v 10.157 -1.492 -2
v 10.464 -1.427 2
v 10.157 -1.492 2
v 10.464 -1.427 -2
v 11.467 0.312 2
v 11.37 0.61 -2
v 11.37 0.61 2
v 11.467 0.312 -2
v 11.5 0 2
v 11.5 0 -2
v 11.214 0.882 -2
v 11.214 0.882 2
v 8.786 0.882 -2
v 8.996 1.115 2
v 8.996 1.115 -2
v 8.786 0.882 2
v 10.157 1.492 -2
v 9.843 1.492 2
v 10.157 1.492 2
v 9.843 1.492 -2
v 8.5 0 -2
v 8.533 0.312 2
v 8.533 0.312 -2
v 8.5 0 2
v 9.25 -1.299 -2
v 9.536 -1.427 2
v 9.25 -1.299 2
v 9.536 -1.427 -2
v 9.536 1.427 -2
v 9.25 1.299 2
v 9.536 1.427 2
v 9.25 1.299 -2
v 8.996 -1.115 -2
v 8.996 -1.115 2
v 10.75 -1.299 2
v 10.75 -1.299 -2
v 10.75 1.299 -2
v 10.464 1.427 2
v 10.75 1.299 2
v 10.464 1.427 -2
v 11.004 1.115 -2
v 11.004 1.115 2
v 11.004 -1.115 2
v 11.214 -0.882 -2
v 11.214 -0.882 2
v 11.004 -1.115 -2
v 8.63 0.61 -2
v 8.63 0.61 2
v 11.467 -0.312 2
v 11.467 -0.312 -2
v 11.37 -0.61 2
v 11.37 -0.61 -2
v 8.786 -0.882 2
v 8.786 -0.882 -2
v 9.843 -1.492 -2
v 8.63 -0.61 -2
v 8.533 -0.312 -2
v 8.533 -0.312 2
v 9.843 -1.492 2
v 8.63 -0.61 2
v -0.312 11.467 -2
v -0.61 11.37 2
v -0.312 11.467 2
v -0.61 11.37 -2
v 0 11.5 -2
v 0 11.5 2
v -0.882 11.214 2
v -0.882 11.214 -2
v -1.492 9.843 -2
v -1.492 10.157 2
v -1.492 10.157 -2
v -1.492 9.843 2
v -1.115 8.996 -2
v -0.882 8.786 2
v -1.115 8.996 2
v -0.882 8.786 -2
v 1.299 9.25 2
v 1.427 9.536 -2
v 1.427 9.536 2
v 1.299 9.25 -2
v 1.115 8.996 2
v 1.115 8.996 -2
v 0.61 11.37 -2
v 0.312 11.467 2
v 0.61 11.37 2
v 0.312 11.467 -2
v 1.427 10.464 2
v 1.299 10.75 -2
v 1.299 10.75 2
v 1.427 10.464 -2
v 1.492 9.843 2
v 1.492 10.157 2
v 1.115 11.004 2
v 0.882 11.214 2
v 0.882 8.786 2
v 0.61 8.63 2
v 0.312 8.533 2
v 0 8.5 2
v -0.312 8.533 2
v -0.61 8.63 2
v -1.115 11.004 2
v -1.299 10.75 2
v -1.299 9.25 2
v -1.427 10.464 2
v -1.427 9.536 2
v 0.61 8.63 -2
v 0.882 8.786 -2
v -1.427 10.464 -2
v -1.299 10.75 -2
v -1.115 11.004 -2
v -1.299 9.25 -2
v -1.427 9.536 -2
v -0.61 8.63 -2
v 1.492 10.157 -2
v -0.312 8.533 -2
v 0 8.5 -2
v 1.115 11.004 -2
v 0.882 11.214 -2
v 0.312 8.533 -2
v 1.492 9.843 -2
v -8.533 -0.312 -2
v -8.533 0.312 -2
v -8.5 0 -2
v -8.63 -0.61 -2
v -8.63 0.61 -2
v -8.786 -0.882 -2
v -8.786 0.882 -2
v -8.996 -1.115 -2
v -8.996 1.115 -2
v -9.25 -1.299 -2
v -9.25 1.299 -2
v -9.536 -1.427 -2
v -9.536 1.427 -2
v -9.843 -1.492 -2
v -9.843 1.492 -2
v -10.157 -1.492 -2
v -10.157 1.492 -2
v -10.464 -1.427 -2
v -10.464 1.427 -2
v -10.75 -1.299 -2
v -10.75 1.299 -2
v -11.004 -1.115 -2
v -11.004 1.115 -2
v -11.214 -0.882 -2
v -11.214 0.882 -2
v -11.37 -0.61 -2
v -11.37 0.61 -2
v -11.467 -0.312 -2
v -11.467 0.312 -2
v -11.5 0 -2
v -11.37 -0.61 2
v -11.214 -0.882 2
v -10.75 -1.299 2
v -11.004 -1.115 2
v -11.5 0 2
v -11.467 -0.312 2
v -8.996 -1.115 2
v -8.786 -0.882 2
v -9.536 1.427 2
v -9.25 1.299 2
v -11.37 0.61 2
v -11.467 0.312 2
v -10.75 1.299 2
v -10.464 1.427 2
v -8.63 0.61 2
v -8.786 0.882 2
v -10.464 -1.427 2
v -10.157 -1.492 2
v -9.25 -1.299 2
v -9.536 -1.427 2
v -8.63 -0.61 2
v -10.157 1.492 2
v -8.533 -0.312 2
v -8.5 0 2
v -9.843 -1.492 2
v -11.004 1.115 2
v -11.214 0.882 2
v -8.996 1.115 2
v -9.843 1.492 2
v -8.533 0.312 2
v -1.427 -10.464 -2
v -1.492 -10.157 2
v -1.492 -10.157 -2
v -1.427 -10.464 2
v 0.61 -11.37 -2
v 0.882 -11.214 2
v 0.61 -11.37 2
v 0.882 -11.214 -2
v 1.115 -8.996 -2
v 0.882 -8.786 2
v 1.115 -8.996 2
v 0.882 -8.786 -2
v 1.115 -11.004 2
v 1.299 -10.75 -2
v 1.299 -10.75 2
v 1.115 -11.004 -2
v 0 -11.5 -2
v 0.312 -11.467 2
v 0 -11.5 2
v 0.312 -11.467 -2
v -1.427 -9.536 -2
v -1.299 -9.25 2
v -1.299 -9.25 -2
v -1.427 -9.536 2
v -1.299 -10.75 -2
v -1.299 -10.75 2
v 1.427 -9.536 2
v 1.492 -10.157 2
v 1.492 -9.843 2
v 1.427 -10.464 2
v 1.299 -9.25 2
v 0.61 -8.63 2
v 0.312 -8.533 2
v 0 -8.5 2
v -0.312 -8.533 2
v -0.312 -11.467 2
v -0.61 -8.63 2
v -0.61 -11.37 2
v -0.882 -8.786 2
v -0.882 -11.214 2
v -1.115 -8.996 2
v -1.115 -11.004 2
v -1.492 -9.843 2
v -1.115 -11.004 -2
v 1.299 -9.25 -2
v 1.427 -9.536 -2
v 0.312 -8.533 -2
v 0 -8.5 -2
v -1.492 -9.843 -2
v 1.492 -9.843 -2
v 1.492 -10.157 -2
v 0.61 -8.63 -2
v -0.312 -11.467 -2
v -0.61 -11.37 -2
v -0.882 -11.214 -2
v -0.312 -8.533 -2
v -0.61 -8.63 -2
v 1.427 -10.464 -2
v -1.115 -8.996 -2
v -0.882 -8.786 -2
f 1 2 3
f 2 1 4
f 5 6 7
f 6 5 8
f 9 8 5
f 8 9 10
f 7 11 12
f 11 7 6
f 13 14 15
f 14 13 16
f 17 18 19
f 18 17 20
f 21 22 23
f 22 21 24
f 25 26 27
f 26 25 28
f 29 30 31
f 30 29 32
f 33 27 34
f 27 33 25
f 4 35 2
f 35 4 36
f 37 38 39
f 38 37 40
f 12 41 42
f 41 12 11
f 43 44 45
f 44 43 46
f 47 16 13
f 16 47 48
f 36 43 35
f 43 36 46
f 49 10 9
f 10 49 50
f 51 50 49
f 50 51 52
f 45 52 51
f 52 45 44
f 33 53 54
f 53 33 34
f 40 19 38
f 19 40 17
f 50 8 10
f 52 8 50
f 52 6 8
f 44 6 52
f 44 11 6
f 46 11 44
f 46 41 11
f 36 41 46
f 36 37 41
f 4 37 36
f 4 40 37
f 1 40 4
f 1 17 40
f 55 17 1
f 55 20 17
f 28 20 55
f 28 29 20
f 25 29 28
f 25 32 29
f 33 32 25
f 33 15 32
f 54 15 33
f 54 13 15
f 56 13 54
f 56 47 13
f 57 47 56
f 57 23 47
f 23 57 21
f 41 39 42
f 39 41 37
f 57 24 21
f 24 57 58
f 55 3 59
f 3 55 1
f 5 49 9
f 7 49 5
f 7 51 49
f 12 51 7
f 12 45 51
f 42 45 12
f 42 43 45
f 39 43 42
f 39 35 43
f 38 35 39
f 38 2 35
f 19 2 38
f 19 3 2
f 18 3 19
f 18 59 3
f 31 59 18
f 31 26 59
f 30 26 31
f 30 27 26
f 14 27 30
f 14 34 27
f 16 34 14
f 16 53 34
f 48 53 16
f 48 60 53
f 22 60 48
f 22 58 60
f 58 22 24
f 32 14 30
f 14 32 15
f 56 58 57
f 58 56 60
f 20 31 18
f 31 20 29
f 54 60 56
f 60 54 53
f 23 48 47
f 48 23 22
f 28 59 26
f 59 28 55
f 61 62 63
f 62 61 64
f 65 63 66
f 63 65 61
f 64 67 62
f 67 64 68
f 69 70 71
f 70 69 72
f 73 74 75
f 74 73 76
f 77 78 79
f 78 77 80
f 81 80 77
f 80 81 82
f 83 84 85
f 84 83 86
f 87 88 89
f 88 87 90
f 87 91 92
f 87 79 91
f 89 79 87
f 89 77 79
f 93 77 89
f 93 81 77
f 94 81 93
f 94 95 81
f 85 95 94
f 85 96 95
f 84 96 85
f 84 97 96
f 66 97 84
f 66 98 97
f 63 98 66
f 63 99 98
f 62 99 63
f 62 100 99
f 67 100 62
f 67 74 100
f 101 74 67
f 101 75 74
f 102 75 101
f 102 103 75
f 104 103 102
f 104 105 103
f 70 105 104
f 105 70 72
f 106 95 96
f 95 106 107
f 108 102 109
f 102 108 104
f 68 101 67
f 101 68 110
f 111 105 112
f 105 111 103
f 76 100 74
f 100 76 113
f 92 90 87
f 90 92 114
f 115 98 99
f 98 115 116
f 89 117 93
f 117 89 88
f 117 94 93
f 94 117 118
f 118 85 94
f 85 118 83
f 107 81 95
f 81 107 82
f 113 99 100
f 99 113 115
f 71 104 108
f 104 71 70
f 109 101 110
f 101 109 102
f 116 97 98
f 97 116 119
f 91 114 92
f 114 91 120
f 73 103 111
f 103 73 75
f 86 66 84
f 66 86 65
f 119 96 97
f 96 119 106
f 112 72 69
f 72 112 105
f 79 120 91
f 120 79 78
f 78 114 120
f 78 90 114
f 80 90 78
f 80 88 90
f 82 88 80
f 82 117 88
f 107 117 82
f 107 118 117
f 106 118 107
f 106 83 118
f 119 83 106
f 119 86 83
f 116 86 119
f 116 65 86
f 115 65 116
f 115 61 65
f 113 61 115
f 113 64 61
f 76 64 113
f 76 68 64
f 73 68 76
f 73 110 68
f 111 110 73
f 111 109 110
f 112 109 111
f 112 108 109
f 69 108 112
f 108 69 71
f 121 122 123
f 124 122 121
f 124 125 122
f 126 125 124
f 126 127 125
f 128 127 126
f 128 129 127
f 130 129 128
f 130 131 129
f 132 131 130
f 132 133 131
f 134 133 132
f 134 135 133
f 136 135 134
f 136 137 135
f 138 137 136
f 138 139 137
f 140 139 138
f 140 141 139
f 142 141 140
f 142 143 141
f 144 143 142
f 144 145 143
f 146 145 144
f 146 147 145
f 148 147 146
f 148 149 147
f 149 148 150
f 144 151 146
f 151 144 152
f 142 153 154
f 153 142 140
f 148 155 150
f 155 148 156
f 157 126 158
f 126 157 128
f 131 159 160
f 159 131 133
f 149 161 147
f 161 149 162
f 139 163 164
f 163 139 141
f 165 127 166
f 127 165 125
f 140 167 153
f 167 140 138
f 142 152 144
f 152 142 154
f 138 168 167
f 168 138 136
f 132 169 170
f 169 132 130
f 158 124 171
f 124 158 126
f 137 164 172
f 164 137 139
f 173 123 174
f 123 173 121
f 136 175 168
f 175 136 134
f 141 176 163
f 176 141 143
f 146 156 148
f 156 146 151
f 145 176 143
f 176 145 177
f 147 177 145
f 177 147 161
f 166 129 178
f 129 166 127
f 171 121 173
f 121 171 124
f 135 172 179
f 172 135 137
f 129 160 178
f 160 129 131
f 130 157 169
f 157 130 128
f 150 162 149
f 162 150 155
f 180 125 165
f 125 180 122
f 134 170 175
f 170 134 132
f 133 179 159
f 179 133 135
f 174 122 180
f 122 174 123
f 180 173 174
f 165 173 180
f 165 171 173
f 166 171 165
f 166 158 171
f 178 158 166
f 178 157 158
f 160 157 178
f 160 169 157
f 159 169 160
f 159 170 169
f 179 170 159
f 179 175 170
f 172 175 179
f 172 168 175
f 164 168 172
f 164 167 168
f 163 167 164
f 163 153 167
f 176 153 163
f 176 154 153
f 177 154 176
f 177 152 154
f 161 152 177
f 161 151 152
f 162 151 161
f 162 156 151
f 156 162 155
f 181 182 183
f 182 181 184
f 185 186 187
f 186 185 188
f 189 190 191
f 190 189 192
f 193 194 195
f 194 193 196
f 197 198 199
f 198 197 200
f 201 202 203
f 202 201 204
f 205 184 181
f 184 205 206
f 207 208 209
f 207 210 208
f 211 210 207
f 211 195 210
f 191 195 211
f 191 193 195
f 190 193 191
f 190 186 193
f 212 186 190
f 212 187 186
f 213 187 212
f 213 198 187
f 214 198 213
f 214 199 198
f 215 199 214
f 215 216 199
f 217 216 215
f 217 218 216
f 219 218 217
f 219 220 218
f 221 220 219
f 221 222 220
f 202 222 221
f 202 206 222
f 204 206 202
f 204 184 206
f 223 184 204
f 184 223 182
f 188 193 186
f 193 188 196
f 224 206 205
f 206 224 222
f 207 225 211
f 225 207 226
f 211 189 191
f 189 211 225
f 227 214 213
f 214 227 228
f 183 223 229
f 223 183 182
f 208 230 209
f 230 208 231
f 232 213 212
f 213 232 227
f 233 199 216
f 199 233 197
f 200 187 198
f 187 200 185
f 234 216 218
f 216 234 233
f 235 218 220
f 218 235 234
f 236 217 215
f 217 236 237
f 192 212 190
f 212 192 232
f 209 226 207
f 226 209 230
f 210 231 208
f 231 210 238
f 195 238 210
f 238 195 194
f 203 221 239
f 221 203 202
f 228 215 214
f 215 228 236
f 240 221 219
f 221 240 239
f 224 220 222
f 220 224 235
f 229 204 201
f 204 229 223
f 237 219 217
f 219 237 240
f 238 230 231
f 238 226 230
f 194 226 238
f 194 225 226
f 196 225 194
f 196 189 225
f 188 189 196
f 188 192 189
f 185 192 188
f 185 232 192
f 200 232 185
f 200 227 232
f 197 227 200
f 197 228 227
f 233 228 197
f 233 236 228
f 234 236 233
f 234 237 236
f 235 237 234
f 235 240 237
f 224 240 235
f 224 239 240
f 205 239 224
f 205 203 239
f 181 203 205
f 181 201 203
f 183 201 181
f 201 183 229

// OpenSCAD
// file: ../../parts/DRW-002-B-Wheel-Frame-Assembly/b4_rivet_pin.scad
// part_id: b4
// name: B4 rivet pin
// source_drawing_ids: DRW-002
// units: mm
// revision: 0.2
// SPDX-License-Identifier: MIT

module part_b4(pin_d = 3.0, pin_h = 4.0) {
    cylinder(d = pin_d, h = pin_h, center = true, $fn = 30);
}

// ---- "main guard" ----
// Default to previewing when opened directly:
if (is_undef(__LIB_MODE__)) {
    part_b4();
}
// file: ../../parts/DRW-002-B-Wheel-Frame-Assembly/b2_gear_ring.scad
// part_id: b2
// name: B2 gear ring
// source_drawing_ids: DRW-002
// units: mm
// revision: 0.4
// SPDX-License-Identifier: MIT

module b2_trial_tooth_2d(base_r = 14.55, tip_r = 16.15, half_base_w = 0.52) {
    polygon(points = [
        [-half_base_w, base_r],
        [half_base_w, base_r],
        [0, tip_r]
    ]);
}

module b2_teeth_2d(tooth_count = 64, clip_r = 15.50) {
    pitch_deg = 360 / tooth_count;

    intersection() {
        union() {
            for (i = [0 : tooth_count - 1])
                rotate(i * pitch_deg) b2_trial_tooth_2d();
        }
        circle(r = clip_r, $fn = 180);
    }
}

module b2_gear_2d(
    root_d = 29.10,
    center_d = 11.0,
    rivet_d = 3.0,
    rivet_pitch = 20.0
) {
    difference() {
        union() {
            circle(d = root_d, $fn = 180);
            b2_teeth_2d();
        }
        circle(d = center_d, $fn = 60);
        for (a = [0, 90, 180, 270])
            rotate(a) translate([rivet_pitch / 2, 0]) circle(d = rivet_d, $fn = 28);
    }
}

module part_b2(thickness = 2.0) {
    translate([0, 0, -thickness / 2])
        linear_extrude(height = thickness)
            b2_gear_2d();
}

// ---- "main guard" ----
// Default to previewing when opened directly:
if (is_undef(__LIB_MODE__)) {
    part_b2();
}
// main file
// DRW-002 reusable B2 subassembly (b2, b4 x4).
// Centered on the gear axis at origin for reuse in sheet scenes.
// SPDX-License-Identifier: MIT

use <../../parts/DRW-002-B-Wheel-Frame-Assembly/b2_gear_ring.scad>
use <../../parts/DRW-002-B-Wheel-Frame-Assembly/b4_rivet_pin.scad>

module drw002_b2_subassembly(
    rivet_pcd_r = 10.0,
    rivet_z = 0
) {
    color([0.45, 0.30, 0.18])
        part_b2();

    color([0.25, 0.25, 0.25])
        for (a = [0, 90, 180, 270])
            rotate([0, 0, a])
                translate([rivet_pcd_r, 0, rivet_z])
                    part_b4();
}

// ---- "main guard" ----
if (is_undef(__LIB_MODE__)) {
    drw002_b2_subassembly();
}
